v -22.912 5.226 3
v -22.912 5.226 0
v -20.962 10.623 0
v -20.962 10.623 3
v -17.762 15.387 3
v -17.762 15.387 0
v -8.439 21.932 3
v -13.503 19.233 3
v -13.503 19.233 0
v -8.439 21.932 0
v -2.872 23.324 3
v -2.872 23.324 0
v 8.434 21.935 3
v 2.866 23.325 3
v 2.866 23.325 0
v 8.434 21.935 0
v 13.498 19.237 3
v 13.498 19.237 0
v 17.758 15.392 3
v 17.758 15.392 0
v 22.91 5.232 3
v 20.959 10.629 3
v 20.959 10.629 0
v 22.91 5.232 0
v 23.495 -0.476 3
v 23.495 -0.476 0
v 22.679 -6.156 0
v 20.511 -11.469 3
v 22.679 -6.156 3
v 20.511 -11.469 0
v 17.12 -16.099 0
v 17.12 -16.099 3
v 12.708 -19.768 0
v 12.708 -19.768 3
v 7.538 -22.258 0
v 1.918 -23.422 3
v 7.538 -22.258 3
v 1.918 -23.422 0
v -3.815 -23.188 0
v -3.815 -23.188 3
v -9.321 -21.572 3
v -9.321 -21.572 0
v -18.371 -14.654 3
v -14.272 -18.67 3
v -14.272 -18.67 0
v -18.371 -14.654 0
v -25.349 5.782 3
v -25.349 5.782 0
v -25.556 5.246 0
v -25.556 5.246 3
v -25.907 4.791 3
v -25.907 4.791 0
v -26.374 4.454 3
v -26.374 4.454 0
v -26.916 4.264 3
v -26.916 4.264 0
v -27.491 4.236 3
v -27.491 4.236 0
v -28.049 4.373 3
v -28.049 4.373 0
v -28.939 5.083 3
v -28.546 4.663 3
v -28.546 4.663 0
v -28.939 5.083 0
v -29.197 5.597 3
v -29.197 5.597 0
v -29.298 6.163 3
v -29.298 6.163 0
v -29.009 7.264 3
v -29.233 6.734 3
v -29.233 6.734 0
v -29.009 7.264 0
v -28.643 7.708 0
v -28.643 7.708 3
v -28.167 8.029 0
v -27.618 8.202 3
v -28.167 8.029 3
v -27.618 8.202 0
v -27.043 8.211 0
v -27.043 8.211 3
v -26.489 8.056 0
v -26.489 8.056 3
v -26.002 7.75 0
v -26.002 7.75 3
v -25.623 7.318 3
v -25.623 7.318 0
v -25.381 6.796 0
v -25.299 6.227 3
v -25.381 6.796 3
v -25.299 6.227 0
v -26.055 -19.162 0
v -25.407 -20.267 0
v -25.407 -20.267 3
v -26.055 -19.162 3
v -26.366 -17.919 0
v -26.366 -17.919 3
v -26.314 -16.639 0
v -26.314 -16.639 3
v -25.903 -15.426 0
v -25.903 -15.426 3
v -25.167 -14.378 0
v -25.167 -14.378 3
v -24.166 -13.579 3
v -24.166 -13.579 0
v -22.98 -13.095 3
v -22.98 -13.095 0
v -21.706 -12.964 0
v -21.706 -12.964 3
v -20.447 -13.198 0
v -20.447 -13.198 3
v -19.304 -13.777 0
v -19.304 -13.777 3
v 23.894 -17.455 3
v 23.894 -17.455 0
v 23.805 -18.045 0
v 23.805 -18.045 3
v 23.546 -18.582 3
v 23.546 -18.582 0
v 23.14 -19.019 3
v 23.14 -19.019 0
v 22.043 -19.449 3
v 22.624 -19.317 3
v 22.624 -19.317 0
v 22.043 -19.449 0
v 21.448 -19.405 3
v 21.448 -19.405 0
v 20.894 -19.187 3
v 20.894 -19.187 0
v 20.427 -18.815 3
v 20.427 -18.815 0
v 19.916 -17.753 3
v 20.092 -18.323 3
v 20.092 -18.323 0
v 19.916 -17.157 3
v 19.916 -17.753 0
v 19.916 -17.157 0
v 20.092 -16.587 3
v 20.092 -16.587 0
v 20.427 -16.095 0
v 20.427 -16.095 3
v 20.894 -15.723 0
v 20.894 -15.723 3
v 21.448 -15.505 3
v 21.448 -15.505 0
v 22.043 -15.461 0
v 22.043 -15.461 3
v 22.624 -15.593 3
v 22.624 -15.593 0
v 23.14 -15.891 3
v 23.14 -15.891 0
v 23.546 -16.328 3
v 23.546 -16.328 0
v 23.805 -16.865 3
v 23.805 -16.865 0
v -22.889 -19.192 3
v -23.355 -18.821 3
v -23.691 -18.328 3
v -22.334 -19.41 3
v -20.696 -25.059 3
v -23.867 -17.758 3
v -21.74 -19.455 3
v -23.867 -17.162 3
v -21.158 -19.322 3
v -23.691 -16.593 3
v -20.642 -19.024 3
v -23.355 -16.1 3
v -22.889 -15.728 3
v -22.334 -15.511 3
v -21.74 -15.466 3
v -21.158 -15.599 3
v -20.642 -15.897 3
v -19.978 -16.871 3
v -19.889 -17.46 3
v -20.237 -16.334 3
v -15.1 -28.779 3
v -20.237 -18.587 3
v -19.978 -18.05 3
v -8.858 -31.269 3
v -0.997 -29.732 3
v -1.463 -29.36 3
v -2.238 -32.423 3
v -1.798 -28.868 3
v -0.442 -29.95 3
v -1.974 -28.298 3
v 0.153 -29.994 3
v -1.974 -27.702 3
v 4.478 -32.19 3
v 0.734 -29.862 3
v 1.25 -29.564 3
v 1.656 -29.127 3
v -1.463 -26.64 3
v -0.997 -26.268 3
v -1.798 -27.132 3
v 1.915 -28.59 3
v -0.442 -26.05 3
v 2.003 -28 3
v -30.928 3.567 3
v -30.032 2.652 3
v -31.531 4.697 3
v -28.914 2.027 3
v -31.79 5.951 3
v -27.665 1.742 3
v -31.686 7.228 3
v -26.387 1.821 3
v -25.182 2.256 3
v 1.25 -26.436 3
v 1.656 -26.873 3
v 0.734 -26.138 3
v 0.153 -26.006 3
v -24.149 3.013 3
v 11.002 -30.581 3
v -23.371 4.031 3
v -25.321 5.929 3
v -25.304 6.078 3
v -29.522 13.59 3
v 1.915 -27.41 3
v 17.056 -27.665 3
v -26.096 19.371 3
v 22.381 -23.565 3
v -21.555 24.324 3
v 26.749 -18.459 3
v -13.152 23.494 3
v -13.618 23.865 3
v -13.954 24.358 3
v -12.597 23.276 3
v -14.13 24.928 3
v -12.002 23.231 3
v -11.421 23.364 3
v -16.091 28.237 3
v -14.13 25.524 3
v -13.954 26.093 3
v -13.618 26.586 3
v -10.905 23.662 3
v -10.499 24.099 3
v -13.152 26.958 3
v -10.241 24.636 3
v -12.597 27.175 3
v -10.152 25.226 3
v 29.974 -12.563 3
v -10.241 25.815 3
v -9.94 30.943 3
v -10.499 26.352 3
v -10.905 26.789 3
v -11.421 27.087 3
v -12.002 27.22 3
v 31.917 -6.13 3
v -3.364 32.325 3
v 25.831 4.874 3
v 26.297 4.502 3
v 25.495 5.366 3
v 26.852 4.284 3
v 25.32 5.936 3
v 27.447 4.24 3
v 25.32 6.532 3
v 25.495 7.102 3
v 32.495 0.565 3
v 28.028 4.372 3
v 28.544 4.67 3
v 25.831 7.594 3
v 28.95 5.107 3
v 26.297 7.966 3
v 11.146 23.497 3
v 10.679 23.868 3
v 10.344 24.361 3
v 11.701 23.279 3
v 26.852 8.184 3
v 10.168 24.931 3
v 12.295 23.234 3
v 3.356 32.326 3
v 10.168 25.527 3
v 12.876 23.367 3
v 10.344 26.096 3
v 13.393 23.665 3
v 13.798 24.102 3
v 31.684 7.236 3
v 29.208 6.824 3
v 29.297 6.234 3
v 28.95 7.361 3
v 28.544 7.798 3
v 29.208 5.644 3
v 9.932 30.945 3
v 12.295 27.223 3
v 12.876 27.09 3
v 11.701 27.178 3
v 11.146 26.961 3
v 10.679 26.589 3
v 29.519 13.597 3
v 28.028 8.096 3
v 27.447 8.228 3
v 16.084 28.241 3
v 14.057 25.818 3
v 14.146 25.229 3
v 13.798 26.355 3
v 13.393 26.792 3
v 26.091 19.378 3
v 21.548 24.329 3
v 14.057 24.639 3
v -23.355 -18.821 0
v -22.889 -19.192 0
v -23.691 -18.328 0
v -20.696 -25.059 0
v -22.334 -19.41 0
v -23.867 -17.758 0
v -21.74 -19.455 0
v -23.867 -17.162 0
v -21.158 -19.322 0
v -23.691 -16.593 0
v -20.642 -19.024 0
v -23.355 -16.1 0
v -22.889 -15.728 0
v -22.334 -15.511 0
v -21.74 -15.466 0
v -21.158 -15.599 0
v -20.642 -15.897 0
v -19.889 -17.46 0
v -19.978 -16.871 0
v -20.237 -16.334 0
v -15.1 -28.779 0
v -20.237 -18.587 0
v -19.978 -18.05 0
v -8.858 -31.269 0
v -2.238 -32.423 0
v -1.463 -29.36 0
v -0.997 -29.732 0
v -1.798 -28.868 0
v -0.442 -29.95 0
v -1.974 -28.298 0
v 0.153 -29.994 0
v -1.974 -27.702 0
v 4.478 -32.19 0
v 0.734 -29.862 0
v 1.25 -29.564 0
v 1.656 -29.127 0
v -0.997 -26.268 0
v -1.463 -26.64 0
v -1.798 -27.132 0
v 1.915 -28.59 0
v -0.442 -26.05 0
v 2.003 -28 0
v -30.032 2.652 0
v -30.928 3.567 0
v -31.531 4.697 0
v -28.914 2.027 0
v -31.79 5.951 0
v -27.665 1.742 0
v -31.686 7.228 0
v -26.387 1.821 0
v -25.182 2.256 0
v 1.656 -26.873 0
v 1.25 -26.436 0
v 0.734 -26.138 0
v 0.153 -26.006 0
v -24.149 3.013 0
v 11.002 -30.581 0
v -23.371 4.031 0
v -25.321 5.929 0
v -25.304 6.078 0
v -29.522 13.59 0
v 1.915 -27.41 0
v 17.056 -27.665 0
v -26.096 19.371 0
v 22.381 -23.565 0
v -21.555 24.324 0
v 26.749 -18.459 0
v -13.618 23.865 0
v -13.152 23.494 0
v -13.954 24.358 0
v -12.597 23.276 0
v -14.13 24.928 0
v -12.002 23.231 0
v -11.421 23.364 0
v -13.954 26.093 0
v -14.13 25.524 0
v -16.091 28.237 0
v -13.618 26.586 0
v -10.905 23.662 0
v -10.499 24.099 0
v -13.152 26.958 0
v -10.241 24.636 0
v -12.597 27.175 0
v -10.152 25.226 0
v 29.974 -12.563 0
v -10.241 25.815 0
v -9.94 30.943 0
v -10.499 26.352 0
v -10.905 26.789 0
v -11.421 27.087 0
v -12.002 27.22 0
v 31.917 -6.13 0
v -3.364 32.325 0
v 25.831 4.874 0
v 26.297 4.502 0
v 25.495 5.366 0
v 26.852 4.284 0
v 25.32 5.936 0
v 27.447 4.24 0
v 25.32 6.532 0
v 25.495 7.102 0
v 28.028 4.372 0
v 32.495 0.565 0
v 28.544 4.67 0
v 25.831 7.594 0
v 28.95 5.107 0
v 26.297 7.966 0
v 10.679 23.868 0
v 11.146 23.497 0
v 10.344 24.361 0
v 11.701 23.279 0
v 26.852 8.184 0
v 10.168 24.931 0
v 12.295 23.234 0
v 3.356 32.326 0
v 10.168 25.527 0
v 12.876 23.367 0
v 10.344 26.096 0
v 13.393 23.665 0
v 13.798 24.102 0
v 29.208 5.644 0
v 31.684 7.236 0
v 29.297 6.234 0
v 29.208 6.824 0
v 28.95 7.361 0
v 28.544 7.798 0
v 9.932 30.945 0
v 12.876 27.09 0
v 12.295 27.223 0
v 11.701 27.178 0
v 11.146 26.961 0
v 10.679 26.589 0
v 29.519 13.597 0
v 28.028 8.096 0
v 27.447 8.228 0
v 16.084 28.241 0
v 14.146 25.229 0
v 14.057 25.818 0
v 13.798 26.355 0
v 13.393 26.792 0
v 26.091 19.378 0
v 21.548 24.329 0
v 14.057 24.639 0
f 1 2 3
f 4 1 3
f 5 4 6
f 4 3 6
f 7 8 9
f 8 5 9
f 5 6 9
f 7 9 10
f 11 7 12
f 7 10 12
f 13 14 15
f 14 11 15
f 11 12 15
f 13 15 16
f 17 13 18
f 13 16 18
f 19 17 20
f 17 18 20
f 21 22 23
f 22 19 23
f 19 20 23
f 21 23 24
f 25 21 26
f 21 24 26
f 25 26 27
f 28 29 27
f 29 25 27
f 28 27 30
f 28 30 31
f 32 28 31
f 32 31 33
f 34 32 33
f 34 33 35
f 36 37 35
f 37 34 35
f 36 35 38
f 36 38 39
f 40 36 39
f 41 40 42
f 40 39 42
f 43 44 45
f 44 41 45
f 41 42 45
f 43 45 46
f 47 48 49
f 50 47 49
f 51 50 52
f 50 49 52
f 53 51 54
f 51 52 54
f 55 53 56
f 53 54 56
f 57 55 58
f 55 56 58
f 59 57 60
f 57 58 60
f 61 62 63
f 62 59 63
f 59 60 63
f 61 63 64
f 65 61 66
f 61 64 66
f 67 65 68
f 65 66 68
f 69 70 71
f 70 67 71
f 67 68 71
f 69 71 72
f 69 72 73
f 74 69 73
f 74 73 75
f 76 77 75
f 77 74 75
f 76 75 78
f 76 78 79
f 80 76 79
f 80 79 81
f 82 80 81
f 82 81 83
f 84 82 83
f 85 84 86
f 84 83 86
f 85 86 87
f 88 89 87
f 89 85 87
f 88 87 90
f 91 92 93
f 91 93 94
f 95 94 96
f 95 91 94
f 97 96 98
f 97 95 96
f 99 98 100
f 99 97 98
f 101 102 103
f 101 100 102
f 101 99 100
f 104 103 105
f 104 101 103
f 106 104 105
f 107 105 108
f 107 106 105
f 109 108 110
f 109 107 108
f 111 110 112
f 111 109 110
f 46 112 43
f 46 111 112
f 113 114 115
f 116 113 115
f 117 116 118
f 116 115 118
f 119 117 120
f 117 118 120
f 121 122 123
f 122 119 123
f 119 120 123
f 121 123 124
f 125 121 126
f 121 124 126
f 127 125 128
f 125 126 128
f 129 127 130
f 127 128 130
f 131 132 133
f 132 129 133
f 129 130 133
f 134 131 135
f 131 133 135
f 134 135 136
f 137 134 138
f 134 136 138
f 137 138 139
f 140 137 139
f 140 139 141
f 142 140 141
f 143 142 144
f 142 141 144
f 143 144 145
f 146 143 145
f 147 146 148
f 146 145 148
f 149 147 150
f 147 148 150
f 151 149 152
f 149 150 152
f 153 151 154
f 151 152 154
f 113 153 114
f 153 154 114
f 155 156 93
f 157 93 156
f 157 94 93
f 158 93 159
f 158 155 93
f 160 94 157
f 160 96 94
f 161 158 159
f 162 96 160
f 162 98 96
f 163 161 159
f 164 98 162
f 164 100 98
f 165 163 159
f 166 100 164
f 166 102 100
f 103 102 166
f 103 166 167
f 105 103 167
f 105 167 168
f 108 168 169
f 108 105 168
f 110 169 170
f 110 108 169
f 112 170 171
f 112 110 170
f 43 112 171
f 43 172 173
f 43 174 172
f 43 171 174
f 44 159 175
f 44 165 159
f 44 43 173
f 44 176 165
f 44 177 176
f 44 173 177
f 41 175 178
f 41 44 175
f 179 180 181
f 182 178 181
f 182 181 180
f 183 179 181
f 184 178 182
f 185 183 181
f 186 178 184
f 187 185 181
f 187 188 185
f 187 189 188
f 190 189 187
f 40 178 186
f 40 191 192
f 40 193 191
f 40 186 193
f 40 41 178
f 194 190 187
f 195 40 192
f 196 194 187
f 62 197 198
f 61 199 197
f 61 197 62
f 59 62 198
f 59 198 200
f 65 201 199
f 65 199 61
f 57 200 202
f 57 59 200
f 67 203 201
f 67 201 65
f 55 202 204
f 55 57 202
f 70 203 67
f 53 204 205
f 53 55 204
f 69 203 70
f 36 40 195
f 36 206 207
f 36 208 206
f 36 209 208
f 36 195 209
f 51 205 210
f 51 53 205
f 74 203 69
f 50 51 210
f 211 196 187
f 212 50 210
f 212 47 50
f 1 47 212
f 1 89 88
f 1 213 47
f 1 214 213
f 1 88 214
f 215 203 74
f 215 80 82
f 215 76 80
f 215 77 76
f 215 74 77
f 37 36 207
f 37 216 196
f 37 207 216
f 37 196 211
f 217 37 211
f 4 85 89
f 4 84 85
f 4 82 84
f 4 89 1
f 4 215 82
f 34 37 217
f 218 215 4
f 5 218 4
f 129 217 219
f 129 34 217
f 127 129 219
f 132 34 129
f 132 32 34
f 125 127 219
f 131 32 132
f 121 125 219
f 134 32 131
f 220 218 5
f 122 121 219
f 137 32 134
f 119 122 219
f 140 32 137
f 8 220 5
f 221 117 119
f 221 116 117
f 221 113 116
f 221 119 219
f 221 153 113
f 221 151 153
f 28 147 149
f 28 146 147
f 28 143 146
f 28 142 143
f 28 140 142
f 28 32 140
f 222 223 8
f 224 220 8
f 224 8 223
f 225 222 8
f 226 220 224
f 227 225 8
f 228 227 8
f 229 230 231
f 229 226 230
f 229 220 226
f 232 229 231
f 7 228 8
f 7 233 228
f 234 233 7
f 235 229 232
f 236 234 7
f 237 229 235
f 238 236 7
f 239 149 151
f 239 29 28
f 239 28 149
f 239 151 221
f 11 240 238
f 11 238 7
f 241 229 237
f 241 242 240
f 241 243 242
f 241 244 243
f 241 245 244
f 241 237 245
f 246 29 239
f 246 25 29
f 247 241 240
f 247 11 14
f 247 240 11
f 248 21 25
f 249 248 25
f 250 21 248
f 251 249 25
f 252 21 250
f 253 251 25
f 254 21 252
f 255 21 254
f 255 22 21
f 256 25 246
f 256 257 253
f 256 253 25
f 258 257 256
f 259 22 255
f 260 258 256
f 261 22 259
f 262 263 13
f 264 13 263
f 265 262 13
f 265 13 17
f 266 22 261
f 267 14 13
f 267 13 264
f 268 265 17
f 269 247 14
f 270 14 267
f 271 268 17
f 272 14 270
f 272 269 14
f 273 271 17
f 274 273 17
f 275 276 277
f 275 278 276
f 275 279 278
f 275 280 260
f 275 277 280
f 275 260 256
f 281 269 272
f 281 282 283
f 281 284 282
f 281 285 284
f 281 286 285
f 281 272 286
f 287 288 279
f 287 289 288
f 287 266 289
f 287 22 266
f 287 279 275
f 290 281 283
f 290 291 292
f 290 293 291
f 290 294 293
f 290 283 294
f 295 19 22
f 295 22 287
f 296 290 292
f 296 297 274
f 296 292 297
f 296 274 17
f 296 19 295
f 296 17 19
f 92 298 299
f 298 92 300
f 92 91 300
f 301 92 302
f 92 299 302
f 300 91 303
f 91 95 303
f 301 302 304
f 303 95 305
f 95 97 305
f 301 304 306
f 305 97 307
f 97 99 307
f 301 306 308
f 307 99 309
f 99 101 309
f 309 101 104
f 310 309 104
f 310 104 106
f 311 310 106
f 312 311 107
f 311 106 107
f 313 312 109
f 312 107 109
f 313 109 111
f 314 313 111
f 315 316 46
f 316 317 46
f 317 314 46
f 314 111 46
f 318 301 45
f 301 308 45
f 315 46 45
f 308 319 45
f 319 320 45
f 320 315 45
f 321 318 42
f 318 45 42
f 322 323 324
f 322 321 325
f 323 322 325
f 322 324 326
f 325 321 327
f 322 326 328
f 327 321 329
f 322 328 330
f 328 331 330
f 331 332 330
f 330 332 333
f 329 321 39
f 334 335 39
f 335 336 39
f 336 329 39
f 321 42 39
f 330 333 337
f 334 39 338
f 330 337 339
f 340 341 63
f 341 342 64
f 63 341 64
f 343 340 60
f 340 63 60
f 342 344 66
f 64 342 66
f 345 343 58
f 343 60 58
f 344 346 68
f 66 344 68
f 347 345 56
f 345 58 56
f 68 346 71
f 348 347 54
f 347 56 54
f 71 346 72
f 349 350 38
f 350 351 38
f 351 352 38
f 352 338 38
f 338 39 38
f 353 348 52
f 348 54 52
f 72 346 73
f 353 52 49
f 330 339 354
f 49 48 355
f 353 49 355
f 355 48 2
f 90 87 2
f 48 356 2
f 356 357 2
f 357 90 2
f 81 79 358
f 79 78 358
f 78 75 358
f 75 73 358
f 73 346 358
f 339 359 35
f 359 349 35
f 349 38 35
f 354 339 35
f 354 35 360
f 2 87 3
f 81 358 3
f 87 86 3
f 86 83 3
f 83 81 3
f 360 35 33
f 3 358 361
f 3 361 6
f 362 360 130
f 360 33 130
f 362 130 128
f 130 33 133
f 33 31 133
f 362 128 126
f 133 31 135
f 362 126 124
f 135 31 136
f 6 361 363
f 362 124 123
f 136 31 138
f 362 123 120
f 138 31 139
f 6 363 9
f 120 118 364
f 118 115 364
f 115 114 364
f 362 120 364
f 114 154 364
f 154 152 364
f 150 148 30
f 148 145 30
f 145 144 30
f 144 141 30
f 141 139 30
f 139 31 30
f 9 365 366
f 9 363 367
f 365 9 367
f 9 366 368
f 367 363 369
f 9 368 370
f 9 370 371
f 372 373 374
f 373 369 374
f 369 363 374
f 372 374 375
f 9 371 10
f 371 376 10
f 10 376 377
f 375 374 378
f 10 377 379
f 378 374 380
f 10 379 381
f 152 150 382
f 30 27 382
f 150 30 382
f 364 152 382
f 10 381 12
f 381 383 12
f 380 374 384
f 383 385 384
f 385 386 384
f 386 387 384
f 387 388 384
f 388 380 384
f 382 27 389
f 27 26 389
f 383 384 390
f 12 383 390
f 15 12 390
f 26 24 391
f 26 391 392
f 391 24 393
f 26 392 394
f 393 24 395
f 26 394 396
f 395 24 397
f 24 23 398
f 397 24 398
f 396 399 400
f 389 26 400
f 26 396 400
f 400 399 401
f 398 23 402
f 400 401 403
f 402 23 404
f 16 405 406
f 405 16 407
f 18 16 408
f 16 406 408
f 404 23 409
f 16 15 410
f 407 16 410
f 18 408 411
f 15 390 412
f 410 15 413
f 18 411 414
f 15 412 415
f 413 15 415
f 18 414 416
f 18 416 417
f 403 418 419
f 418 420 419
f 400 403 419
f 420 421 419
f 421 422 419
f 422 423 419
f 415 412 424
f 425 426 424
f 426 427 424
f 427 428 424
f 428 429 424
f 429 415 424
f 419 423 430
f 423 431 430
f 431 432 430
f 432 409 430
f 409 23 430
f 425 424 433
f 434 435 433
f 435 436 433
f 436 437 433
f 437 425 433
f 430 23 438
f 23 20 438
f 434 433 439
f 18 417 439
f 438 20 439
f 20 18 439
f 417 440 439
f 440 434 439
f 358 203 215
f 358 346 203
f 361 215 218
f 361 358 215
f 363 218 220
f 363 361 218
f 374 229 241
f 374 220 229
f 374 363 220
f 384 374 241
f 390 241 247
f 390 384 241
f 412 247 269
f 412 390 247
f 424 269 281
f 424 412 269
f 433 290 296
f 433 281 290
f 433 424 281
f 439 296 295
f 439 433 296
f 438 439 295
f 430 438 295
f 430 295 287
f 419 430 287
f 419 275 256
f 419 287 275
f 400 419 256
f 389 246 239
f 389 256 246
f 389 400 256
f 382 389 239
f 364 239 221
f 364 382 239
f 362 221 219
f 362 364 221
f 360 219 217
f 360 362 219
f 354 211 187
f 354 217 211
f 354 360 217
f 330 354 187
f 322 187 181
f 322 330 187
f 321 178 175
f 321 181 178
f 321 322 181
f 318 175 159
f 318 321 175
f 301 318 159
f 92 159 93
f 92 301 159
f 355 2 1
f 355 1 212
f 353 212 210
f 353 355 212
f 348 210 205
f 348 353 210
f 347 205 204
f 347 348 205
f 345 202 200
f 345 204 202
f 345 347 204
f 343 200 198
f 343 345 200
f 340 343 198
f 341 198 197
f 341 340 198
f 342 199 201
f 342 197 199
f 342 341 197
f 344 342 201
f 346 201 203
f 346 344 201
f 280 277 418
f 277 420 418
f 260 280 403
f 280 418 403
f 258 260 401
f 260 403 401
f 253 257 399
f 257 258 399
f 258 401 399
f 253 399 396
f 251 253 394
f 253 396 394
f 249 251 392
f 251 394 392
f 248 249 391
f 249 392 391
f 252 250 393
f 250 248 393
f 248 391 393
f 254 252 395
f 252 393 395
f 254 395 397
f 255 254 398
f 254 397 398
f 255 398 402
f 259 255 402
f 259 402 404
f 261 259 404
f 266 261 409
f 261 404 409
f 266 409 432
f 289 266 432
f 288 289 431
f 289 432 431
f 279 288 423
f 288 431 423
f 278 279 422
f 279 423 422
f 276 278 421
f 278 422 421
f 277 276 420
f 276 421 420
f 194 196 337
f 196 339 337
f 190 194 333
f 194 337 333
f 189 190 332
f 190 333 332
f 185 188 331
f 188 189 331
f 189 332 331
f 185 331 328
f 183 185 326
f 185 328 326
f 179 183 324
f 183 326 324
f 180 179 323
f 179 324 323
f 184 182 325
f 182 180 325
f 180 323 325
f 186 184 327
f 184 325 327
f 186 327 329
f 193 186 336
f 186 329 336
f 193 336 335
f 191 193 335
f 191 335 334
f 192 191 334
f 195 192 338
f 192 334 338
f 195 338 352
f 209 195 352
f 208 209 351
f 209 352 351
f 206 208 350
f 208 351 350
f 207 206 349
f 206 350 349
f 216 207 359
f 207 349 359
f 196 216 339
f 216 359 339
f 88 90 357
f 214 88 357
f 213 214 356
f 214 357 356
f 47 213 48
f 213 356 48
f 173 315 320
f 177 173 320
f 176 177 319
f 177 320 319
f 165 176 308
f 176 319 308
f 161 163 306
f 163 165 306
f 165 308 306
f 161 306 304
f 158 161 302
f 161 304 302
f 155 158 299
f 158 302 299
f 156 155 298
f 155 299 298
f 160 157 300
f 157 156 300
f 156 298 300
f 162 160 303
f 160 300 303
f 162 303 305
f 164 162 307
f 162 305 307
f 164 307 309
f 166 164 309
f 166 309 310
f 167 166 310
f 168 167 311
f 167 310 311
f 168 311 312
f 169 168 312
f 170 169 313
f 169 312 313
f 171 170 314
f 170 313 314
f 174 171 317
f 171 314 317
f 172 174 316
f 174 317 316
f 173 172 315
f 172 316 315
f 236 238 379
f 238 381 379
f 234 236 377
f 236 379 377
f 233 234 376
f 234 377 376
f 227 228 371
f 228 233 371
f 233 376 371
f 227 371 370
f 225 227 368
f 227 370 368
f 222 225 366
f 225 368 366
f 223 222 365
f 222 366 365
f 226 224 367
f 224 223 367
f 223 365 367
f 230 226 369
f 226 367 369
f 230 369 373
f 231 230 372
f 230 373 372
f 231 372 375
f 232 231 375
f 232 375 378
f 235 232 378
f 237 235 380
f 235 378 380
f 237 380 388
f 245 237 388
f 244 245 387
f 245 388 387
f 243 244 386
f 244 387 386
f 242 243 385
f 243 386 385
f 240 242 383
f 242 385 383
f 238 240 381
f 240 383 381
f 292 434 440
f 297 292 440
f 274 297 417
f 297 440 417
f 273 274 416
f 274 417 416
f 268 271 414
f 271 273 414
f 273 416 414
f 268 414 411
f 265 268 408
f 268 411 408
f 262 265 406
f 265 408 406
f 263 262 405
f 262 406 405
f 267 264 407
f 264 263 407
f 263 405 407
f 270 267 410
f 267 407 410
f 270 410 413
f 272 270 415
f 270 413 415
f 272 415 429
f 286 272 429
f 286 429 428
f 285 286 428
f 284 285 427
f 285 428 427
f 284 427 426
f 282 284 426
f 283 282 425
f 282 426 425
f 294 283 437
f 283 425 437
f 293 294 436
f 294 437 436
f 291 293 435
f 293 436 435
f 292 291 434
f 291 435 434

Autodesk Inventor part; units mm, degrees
ref_plane "YZ Plane" through (0, 0, 0) normal (1, 0, 0) x (0, 1, 0)
ref_plane "XZ Plane" through (0, 0, 0) normal (0, 1, 0) x (-1, 0, 0)
ref_plane "XY Plane" through (0, 0, 0) normal (0, 0, 1) x (1, 0, 0)
sketch "Sketch1" plane through (0, 0, 0) normal (0, 0, 1) x (1, 0, 0)
  arc A0 (-25.407, -20.2666) -> (-31.6861, 7.228) centre (0, 0) ccw
  arc A1 (-18.3712, -14.6543) -> (-22.9115, 5.2264) centre (0, 0) ccw
  circle A2 centre (27.2972, 6.234) radius 2
  circle A3 centre (12.1456, 25.2286) radius 2
  circle A4 centre (-12.1519, 25.2256) radius 2
  circle A5 centre (-27.2988, 6.2272) radius 2
  circle A6 centre (-21.8891, -17.4604) radius 2
  circle A7 centre (0.0035, -28) radius 2
  circle A8 centre (21.8935, -17.455) radius 2
  arc A9 (-18.3712, -14.6543) -> (-25.407, -20.2666) centre (-21.8891, -17.4604) ccw
  arc A10 (-31.6861, 7.228) -> (-22.9115, 5.2264) centre (-27.2988, 6.2272) ccw
  line L0 (0, 0) -> (-27.2988, 6.2272)
  line L1 (0, 0) -> (-28.0096, 0)
  dimension "d0" = 65
  dimension "d1" = 47
  dimension "d2" = 4
  dimension "d5" = 360
  dimension "d7" = 9
  dimension "d8" = 9
  dimension "d11" = 12.85
  dimension "d12" = 54.596
extrude "Extrusion1" add sketch "Sketch1" along normal blind 3
properties part number "fin entraineur"
